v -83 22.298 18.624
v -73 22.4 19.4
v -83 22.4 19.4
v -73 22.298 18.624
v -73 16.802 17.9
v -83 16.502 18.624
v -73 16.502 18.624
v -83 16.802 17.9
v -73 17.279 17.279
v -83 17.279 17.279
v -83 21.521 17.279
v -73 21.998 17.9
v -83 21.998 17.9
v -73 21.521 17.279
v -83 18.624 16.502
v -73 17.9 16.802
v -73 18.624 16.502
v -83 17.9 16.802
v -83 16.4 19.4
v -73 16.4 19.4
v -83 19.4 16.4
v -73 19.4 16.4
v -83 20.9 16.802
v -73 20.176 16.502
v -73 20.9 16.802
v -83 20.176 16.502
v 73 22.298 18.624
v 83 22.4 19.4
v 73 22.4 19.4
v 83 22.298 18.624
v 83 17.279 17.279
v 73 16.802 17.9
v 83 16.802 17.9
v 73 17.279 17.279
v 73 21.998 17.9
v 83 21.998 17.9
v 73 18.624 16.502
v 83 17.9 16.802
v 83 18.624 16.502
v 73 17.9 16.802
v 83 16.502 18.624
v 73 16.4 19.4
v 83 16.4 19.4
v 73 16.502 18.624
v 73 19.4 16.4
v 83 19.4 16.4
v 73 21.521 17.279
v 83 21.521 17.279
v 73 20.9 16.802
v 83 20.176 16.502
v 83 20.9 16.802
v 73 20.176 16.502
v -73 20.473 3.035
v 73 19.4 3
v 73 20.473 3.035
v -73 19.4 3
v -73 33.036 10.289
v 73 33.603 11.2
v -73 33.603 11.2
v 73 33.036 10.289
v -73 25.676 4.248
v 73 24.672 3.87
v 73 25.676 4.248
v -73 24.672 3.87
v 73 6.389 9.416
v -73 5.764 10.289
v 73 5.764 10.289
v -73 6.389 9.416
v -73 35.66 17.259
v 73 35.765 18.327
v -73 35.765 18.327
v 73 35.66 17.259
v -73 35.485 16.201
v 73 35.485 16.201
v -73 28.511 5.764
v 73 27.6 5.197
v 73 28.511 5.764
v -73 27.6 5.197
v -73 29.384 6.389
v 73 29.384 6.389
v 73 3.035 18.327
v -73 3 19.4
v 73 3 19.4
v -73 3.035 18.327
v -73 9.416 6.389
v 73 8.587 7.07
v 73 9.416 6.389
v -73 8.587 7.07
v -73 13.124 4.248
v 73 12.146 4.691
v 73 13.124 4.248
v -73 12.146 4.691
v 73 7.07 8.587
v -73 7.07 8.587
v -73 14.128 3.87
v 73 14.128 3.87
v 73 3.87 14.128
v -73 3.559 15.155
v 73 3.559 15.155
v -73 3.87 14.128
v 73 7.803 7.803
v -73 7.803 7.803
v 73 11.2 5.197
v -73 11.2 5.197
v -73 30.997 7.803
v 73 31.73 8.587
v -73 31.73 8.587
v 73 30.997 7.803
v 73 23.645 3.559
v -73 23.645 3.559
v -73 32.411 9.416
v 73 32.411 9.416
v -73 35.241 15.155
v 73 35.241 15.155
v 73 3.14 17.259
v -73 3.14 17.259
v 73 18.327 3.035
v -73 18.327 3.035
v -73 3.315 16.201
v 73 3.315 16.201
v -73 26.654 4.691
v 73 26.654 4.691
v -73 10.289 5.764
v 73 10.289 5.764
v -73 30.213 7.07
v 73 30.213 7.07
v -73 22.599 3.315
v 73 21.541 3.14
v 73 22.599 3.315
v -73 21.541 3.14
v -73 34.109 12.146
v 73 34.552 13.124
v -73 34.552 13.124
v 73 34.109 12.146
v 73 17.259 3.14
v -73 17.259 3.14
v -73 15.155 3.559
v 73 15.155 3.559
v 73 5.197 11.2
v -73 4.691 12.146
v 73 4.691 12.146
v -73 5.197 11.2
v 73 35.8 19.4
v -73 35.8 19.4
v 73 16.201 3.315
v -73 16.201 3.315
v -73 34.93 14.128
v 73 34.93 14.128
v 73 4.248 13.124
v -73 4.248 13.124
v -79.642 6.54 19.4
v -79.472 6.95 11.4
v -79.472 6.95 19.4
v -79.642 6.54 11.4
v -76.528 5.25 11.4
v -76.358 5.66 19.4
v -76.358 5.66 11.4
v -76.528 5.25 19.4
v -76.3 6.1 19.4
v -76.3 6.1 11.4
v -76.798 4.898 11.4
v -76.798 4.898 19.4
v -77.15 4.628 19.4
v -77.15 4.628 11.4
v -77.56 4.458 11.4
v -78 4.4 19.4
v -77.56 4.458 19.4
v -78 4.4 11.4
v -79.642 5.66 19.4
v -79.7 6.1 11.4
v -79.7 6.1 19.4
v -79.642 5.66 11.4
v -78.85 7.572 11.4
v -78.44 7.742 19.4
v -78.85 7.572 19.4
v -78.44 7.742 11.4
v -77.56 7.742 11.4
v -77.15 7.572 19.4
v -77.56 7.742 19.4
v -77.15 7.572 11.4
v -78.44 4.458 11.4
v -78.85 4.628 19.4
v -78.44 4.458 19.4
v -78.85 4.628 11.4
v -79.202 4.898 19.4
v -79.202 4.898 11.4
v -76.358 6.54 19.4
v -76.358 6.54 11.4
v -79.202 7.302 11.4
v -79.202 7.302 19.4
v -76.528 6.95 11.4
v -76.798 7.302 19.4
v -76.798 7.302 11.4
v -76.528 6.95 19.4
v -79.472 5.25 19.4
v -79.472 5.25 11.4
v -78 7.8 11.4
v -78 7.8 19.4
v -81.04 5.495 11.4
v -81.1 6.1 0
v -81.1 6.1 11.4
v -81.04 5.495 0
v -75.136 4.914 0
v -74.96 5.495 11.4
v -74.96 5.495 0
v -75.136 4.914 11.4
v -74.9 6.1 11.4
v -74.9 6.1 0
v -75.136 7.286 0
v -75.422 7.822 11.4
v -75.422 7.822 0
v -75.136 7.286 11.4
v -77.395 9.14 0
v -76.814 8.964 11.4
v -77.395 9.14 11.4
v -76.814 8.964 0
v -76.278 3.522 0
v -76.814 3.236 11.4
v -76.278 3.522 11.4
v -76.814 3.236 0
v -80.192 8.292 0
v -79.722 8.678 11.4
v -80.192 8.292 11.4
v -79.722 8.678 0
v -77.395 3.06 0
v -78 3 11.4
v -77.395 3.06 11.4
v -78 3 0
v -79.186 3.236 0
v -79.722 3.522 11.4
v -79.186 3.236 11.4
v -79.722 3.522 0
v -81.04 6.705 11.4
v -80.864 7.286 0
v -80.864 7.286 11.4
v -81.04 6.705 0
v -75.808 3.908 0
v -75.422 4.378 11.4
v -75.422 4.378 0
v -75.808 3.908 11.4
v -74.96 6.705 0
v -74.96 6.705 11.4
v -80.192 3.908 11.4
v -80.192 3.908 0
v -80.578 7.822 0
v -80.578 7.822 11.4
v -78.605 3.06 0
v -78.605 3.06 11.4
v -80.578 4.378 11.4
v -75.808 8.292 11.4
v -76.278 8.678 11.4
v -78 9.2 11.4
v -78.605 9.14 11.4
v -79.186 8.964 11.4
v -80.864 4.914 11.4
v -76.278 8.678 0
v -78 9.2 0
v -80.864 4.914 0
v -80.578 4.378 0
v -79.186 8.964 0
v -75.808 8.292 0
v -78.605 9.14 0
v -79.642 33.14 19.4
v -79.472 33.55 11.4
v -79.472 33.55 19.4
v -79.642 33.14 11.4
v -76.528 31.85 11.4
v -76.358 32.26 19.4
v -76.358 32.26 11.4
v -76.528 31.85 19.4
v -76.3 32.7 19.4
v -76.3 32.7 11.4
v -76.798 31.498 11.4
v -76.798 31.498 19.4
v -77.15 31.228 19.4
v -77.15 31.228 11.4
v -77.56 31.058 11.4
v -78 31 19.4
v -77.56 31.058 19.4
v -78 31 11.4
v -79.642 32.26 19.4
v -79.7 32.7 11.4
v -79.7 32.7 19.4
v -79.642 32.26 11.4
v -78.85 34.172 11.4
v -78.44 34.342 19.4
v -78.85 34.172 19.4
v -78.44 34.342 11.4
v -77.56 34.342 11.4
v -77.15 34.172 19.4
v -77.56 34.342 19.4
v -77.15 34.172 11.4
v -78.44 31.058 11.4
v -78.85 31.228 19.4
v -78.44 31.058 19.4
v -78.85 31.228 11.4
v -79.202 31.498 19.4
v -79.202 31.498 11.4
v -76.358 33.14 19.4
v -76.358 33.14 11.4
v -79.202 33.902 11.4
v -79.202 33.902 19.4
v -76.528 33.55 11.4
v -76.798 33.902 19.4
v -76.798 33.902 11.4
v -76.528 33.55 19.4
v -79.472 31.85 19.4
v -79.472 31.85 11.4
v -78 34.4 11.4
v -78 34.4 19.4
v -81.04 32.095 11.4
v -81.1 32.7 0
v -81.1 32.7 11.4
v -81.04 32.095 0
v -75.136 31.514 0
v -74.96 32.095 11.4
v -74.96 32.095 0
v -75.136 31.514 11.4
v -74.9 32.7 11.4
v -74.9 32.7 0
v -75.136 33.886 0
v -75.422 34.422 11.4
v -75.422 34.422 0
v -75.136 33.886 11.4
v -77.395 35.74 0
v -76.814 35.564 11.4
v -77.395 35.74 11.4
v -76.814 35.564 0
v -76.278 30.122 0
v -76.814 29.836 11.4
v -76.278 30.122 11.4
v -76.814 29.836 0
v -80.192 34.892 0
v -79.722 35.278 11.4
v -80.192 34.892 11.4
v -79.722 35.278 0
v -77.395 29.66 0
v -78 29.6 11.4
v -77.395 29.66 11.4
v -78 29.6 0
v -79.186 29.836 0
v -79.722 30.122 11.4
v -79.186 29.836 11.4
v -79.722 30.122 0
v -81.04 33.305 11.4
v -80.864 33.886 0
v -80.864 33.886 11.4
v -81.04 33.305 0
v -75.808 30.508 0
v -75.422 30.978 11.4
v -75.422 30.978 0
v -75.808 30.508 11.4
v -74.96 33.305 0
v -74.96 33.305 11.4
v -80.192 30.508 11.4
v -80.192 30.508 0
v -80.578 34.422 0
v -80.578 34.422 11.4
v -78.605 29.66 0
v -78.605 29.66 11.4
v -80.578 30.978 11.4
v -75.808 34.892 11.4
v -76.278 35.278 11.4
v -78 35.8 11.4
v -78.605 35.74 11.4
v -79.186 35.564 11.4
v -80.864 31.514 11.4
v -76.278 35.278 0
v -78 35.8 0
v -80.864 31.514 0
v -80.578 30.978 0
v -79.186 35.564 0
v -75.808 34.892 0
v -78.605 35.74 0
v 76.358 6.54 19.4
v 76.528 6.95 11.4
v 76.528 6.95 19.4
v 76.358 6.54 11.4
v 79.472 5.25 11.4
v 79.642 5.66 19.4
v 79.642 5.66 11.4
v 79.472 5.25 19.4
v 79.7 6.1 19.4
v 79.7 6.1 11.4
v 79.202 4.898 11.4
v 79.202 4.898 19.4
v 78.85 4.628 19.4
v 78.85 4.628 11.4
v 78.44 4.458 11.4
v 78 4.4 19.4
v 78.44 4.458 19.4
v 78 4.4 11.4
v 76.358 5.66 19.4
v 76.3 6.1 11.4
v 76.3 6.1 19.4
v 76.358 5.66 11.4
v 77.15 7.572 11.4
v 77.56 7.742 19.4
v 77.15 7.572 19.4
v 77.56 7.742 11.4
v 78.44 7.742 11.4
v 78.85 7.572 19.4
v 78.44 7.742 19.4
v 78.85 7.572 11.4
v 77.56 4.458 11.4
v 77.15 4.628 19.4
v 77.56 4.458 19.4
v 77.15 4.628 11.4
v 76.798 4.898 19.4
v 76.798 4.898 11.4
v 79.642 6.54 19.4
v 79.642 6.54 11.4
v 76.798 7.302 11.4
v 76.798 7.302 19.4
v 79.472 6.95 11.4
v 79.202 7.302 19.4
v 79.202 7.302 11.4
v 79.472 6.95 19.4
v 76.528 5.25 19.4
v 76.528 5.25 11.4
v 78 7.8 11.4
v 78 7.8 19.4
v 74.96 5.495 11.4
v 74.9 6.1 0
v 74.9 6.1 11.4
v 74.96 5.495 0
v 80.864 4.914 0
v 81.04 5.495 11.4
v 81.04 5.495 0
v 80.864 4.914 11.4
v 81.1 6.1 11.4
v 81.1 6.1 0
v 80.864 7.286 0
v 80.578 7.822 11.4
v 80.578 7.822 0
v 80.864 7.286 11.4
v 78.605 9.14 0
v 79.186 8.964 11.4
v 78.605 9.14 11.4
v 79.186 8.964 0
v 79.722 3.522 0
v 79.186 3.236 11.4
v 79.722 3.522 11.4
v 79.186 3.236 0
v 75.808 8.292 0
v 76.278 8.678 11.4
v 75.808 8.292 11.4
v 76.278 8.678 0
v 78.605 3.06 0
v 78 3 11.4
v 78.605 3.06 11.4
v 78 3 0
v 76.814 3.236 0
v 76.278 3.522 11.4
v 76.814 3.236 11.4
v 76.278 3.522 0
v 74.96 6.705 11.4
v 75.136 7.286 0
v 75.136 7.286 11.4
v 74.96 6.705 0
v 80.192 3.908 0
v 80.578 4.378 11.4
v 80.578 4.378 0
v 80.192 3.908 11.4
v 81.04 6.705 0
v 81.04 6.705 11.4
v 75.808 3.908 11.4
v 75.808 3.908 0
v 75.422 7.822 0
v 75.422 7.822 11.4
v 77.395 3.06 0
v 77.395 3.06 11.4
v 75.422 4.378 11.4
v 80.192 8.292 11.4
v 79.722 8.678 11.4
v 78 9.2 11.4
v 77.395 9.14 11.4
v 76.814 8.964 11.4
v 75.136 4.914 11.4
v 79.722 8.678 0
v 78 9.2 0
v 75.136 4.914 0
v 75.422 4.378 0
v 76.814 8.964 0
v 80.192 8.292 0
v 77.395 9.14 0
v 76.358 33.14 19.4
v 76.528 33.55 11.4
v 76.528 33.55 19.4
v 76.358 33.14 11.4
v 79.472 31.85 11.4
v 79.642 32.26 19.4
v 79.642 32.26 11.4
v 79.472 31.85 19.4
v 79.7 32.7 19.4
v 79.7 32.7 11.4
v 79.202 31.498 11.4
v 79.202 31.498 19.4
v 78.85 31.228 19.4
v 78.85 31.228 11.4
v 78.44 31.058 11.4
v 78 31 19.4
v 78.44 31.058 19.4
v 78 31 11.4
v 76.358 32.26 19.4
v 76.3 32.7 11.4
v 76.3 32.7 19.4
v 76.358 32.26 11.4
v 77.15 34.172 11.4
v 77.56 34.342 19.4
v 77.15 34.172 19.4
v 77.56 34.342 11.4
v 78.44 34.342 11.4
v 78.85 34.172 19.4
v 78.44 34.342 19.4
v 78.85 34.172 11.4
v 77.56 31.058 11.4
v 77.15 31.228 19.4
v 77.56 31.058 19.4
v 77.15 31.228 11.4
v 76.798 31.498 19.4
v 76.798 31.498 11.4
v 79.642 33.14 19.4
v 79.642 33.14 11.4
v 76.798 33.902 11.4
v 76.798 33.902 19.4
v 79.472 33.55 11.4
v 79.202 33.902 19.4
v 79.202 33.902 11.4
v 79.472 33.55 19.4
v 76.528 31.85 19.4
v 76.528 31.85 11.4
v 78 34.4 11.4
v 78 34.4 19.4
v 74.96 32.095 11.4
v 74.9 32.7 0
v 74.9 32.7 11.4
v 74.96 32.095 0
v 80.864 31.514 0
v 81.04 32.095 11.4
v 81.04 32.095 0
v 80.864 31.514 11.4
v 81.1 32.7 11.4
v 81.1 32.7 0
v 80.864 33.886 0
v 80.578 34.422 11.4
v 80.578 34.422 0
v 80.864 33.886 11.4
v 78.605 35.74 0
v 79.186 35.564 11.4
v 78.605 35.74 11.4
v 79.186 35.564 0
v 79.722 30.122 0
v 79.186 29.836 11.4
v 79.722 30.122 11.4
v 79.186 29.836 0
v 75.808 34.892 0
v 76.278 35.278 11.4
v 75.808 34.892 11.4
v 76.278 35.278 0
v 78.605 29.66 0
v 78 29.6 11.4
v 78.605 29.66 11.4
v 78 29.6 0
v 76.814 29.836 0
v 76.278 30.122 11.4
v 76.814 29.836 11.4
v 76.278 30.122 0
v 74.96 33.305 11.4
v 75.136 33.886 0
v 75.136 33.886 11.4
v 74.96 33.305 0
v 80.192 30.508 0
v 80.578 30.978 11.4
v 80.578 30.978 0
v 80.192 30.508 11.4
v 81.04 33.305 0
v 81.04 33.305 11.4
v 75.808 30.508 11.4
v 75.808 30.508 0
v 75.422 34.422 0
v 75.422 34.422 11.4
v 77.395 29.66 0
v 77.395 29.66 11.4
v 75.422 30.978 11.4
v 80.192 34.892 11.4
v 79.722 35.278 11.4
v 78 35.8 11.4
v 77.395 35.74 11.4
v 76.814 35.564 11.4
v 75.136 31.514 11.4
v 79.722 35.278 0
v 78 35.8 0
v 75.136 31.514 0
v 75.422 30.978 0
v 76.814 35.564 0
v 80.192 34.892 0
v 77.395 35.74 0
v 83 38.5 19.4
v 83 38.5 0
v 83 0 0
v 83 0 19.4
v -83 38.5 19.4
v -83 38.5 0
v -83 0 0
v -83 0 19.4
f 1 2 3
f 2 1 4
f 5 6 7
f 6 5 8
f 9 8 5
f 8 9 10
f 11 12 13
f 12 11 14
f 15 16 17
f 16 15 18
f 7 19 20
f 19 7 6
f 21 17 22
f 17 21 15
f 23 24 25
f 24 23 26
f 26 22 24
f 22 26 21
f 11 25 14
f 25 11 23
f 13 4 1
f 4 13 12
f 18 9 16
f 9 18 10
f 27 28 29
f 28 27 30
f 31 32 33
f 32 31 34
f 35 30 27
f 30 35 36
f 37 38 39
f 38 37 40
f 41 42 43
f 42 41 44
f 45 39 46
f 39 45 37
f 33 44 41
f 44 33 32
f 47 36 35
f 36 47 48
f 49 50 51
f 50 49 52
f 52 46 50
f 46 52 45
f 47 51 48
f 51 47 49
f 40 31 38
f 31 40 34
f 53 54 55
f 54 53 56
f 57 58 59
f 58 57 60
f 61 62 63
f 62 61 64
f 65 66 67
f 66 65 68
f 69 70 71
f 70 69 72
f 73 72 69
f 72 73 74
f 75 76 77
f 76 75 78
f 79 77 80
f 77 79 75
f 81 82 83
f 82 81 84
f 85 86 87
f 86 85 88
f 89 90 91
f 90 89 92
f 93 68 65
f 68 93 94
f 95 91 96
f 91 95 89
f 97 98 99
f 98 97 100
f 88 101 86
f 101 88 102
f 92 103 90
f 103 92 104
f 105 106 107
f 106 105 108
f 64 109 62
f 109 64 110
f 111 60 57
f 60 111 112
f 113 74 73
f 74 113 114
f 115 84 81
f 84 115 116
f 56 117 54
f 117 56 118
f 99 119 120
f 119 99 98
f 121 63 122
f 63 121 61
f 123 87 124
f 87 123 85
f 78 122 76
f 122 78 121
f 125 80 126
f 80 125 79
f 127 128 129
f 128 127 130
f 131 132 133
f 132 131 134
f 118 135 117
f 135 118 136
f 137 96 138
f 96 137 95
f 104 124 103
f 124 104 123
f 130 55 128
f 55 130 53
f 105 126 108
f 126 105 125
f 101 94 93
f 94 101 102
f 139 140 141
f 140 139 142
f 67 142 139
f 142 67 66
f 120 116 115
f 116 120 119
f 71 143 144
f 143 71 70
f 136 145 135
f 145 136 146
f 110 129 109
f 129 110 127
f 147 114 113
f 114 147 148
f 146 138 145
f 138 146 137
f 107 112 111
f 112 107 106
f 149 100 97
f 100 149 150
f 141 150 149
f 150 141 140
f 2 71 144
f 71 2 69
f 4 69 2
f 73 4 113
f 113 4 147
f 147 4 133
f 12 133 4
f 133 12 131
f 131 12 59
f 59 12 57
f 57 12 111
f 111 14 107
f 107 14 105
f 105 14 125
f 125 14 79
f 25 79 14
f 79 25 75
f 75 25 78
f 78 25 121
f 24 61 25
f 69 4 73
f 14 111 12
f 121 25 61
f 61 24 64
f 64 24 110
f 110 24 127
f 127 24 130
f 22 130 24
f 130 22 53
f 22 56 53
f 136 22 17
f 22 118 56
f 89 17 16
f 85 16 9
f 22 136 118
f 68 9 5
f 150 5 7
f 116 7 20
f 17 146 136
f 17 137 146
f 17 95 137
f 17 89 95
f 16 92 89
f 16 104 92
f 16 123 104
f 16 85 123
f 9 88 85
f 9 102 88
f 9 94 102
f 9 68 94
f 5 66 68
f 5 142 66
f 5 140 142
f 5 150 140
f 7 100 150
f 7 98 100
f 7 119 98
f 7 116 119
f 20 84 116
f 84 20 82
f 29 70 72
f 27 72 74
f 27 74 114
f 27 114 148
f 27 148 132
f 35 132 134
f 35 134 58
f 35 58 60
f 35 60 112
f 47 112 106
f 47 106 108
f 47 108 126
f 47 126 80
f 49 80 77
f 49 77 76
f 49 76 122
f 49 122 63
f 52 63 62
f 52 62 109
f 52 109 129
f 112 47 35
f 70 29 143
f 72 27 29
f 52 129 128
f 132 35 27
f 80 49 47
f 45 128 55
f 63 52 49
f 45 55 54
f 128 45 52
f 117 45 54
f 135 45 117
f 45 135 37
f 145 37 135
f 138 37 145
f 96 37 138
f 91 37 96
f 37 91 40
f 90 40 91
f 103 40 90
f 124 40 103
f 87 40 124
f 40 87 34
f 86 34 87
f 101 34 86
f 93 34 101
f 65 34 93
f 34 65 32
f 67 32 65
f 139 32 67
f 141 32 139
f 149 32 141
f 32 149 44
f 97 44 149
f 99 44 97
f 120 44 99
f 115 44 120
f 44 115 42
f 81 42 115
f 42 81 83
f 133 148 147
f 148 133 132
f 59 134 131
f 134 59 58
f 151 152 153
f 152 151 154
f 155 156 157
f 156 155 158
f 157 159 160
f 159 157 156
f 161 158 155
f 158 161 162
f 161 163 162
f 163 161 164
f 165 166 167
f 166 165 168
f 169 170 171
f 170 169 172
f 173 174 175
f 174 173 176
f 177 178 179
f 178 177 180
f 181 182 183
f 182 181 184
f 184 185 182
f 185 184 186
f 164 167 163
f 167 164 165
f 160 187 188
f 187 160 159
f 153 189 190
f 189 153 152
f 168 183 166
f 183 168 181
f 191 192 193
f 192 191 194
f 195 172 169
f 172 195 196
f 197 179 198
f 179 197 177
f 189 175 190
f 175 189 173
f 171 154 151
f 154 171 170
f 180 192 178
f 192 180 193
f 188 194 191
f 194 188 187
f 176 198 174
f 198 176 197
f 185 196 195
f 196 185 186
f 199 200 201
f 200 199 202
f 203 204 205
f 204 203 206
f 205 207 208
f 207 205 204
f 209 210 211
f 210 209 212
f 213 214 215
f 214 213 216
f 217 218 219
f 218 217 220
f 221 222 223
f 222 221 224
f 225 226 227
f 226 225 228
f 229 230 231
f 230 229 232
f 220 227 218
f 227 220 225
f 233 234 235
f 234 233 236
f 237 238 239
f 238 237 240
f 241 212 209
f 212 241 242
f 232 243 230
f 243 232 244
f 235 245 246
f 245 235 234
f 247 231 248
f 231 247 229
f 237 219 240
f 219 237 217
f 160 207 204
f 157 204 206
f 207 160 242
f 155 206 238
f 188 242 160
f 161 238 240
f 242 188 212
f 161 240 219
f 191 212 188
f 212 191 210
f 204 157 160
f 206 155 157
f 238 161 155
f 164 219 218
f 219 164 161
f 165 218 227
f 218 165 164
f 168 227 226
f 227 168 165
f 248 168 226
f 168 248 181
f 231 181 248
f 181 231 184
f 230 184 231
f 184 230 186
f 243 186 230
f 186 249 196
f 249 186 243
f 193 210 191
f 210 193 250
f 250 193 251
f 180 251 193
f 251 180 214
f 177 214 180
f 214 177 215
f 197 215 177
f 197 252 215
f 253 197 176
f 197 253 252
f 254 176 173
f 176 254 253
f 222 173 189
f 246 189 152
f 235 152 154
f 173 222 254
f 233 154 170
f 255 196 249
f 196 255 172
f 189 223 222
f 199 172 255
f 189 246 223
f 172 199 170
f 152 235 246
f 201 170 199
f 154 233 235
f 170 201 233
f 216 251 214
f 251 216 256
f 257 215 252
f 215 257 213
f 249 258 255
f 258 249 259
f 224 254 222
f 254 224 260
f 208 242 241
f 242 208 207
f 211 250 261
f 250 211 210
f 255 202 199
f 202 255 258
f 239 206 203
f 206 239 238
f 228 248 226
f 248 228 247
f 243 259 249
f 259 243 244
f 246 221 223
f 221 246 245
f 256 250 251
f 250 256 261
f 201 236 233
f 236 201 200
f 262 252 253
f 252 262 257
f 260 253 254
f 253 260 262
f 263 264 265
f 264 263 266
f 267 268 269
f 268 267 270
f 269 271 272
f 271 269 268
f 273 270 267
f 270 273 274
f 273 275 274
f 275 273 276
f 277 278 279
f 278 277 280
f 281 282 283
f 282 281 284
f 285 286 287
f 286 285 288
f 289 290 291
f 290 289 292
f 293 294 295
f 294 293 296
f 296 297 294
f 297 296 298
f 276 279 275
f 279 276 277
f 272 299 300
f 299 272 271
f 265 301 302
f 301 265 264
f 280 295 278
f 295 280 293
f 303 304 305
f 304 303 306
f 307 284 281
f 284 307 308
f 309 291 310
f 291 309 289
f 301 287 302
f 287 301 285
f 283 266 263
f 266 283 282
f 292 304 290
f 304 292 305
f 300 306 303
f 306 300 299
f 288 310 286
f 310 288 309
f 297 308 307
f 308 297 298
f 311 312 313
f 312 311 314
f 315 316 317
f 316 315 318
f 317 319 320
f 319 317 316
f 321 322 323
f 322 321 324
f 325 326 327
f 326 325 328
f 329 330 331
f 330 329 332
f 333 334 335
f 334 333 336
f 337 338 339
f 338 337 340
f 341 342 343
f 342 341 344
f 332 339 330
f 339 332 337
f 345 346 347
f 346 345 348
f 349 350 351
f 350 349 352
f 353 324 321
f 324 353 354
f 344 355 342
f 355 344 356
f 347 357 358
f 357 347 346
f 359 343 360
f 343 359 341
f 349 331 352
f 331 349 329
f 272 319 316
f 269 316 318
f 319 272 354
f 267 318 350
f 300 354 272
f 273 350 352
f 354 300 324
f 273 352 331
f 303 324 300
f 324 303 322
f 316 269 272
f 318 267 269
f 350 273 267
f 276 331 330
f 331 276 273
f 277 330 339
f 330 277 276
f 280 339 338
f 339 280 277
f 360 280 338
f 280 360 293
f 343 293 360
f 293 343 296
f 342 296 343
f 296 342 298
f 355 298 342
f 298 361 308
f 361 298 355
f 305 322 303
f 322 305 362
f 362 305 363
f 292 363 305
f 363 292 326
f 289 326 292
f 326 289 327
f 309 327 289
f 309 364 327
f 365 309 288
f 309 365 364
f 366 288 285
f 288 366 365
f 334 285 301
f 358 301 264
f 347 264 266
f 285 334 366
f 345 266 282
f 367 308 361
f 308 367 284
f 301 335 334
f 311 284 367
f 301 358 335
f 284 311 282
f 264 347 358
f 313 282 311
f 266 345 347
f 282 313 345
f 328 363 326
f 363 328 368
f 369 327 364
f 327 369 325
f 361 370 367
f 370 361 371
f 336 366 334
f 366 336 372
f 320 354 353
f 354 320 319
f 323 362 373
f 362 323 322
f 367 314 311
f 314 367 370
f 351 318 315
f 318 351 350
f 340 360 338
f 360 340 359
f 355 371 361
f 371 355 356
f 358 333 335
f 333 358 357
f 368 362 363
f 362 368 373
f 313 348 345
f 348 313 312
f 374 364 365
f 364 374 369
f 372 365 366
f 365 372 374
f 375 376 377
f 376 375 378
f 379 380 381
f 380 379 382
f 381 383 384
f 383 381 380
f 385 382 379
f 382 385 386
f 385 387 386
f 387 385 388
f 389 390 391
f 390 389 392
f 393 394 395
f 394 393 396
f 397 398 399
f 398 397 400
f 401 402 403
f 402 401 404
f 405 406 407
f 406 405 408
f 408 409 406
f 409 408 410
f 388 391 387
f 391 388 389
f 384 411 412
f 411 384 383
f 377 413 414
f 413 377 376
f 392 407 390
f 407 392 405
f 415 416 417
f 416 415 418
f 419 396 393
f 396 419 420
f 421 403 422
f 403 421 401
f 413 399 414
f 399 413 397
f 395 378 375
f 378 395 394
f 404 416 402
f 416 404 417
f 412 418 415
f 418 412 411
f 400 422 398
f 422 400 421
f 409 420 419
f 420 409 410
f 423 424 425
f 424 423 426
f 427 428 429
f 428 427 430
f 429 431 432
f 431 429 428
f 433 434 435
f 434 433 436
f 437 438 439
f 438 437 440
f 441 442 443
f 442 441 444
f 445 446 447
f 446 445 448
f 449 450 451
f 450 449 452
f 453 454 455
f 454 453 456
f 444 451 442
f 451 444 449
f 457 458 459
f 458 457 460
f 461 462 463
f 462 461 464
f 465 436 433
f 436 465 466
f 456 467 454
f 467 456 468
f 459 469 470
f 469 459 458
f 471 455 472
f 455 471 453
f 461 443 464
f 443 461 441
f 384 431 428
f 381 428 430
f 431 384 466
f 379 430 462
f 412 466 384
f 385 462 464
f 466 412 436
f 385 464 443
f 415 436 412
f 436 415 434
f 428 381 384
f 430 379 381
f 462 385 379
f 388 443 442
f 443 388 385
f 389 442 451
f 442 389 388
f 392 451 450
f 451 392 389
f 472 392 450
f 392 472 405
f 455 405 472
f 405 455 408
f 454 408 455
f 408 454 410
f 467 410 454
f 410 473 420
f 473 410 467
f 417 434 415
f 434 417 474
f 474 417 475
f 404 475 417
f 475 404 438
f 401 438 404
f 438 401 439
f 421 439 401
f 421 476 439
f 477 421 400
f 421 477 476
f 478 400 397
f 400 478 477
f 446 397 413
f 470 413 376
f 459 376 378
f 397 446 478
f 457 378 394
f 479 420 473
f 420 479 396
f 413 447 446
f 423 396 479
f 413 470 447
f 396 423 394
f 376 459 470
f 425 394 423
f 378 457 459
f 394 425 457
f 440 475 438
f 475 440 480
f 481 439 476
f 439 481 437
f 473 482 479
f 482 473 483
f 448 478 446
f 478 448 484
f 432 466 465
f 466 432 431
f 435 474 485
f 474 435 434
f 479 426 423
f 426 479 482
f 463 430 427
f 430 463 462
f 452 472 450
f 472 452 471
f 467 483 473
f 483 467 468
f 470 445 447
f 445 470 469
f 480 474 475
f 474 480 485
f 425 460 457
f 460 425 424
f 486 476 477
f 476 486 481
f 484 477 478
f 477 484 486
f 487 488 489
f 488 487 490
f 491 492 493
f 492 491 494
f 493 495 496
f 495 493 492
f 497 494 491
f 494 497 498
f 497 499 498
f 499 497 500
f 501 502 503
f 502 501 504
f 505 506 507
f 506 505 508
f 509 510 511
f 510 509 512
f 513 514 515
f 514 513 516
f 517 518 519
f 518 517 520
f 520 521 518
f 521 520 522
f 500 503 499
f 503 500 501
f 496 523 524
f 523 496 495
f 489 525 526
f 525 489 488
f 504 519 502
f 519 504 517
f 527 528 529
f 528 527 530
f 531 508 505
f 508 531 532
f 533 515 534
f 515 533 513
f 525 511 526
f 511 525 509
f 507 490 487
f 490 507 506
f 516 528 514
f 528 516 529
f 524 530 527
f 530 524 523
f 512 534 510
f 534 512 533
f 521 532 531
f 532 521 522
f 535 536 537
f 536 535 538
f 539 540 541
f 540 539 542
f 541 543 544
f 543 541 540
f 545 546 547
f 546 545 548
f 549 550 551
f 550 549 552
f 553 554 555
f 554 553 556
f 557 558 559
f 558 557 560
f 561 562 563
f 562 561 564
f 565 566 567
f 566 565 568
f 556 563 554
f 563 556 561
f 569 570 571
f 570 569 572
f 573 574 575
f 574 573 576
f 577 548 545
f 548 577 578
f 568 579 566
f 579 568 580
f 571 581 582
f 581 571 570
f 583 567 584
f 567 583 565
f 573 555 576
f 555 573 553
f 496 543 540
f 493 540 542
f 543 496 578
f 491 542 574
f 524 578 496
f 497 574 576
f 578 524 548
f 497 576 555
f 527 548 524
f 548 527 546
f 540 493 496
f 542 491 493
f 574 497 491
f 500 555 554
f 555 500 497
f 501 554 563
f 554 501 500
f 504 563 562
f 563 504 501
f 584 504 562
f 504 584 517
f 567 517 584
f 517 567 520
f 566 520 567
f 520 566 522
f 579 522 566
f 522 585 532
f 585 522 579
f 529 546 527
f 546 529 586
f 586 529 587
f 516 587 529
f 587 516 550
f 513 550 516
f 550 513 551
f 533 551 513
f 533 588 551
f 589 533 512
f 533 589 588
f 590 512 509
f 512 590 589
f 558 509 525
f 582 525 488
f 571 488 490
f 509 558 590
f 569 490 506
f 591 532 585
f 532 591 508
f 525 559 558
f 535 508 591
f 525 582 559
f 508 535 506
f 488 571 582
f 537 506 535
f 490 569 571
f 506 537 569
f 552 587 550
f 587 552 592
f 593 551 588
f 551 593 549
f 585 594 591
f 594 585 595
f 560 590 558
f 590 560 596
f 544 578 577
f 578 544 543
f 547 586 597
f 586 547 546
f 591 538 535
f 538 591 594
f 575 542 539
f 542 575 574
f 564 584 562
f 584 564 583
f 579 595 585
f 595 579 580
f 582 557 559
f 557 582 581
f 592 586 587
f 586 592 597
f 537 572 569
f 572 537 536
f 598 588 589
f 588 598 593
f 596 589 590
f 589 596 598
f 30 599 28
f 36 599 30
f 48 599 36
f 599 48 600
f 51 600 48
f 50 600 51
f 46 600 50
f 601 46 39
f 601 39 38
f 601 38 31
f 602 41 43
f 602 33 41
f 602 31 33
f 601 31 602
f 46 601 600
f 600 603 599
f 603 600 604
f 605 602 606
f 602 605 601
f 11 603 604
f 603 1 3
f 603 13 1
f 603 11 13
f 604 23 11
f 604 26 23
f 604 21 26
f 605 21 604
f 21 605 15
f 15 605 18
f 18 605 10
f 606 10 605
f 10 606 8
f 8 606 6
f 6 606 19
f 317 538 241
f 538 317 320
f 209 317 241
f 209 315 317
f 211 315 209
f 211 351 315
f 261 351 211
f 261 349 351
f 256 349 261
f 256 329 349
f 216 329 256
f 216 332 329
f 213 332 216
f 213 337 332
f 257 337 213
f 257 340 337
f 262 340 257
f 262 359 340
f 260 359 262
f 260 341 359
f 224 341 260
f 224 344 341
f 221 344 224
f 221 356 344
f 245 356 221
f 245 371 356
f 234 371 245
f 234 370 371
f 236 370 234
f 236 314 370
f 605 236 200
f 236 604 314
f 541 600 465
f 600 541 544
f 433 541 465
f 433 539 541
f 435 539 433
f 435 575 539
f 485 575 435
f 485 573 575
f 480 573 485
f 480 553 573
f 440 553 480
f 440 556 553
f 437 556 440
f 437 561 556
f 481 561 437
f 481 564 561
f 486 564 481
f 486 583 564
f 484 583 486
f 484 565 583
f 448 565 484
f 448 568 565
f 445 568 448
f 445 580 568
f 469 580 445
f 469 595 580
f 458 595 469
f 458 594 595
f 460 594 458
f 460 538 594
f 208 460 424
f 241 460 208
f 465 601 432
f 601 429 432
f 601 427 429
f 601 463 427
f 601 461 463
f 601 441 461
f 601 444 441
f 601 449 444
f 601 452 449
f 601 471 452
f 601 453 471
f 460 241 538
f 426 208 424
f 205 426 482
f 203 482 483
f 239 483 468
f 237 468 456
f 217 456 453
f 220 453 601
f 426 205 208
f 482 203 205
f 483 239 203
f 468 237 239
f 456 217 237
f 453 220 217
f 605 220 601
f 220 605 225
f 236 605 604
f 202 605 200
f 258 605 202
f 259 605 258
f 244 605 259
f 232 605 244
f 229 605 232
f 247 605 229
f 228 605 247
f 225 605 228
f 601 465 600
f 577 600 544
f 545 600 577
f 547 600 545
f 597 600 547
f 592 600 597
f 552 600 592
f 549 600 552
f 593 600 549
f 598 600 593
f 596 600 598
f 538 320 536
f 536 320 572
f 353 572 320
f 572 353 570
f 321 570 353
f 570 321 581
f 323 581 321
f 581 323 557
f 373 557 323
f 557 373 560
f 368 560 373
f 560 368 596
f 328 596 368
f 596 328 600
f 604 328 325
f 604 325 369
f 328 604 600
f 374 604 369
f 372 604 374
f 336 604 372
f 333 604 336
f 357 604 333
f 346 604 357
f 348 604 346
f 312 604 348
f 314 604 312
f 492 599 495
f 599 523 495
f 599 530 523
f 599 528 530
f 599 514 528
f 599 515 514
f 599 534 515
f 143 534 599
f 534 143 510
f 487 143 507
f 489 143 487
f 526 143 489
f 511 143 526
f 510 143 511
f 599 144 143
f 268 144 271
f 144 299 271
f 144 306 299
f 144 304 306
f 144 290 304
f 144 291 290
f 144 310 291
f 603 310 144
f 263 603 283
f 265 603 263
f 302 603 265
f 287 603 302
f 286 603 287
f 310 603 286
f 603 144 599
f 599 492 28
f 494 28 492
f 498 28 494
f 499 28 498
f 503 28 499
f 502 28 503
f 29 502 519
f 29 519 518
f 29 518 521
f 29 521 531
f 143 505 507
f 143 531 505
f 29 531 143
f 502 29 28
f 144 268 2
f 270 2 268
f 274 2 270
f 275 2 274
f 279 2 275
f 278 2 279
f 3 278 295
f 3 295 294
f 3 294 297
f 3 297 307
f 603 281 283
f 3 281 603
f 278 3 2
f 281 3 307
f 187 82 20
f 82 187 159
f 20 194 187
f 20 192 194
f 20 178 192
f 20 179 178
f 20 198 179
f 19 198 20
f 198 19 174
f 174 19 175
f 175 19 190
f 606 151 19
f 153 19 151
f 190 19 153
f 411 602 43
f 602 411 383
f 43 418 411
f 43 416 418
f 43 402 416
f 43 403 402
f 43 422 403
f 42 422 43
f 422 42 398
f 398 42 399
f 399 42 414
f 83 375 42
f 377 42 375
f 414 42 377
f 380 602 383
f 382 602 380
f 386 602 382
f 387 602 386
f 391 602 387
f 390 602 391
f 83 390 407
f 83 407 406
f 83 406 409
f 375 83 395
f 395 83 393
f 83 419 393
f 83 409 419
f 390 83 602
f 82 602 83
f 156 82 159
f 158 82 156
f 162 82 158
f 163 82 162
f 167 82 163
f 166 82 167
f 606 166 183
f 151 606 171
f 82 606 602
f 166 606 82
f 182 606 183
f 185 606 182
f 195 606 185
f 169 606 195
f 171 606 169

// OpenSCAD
include <../lib/meshtastic-drybag-node-lib.scad>;
$fn = 40;
battery_lid_print();
